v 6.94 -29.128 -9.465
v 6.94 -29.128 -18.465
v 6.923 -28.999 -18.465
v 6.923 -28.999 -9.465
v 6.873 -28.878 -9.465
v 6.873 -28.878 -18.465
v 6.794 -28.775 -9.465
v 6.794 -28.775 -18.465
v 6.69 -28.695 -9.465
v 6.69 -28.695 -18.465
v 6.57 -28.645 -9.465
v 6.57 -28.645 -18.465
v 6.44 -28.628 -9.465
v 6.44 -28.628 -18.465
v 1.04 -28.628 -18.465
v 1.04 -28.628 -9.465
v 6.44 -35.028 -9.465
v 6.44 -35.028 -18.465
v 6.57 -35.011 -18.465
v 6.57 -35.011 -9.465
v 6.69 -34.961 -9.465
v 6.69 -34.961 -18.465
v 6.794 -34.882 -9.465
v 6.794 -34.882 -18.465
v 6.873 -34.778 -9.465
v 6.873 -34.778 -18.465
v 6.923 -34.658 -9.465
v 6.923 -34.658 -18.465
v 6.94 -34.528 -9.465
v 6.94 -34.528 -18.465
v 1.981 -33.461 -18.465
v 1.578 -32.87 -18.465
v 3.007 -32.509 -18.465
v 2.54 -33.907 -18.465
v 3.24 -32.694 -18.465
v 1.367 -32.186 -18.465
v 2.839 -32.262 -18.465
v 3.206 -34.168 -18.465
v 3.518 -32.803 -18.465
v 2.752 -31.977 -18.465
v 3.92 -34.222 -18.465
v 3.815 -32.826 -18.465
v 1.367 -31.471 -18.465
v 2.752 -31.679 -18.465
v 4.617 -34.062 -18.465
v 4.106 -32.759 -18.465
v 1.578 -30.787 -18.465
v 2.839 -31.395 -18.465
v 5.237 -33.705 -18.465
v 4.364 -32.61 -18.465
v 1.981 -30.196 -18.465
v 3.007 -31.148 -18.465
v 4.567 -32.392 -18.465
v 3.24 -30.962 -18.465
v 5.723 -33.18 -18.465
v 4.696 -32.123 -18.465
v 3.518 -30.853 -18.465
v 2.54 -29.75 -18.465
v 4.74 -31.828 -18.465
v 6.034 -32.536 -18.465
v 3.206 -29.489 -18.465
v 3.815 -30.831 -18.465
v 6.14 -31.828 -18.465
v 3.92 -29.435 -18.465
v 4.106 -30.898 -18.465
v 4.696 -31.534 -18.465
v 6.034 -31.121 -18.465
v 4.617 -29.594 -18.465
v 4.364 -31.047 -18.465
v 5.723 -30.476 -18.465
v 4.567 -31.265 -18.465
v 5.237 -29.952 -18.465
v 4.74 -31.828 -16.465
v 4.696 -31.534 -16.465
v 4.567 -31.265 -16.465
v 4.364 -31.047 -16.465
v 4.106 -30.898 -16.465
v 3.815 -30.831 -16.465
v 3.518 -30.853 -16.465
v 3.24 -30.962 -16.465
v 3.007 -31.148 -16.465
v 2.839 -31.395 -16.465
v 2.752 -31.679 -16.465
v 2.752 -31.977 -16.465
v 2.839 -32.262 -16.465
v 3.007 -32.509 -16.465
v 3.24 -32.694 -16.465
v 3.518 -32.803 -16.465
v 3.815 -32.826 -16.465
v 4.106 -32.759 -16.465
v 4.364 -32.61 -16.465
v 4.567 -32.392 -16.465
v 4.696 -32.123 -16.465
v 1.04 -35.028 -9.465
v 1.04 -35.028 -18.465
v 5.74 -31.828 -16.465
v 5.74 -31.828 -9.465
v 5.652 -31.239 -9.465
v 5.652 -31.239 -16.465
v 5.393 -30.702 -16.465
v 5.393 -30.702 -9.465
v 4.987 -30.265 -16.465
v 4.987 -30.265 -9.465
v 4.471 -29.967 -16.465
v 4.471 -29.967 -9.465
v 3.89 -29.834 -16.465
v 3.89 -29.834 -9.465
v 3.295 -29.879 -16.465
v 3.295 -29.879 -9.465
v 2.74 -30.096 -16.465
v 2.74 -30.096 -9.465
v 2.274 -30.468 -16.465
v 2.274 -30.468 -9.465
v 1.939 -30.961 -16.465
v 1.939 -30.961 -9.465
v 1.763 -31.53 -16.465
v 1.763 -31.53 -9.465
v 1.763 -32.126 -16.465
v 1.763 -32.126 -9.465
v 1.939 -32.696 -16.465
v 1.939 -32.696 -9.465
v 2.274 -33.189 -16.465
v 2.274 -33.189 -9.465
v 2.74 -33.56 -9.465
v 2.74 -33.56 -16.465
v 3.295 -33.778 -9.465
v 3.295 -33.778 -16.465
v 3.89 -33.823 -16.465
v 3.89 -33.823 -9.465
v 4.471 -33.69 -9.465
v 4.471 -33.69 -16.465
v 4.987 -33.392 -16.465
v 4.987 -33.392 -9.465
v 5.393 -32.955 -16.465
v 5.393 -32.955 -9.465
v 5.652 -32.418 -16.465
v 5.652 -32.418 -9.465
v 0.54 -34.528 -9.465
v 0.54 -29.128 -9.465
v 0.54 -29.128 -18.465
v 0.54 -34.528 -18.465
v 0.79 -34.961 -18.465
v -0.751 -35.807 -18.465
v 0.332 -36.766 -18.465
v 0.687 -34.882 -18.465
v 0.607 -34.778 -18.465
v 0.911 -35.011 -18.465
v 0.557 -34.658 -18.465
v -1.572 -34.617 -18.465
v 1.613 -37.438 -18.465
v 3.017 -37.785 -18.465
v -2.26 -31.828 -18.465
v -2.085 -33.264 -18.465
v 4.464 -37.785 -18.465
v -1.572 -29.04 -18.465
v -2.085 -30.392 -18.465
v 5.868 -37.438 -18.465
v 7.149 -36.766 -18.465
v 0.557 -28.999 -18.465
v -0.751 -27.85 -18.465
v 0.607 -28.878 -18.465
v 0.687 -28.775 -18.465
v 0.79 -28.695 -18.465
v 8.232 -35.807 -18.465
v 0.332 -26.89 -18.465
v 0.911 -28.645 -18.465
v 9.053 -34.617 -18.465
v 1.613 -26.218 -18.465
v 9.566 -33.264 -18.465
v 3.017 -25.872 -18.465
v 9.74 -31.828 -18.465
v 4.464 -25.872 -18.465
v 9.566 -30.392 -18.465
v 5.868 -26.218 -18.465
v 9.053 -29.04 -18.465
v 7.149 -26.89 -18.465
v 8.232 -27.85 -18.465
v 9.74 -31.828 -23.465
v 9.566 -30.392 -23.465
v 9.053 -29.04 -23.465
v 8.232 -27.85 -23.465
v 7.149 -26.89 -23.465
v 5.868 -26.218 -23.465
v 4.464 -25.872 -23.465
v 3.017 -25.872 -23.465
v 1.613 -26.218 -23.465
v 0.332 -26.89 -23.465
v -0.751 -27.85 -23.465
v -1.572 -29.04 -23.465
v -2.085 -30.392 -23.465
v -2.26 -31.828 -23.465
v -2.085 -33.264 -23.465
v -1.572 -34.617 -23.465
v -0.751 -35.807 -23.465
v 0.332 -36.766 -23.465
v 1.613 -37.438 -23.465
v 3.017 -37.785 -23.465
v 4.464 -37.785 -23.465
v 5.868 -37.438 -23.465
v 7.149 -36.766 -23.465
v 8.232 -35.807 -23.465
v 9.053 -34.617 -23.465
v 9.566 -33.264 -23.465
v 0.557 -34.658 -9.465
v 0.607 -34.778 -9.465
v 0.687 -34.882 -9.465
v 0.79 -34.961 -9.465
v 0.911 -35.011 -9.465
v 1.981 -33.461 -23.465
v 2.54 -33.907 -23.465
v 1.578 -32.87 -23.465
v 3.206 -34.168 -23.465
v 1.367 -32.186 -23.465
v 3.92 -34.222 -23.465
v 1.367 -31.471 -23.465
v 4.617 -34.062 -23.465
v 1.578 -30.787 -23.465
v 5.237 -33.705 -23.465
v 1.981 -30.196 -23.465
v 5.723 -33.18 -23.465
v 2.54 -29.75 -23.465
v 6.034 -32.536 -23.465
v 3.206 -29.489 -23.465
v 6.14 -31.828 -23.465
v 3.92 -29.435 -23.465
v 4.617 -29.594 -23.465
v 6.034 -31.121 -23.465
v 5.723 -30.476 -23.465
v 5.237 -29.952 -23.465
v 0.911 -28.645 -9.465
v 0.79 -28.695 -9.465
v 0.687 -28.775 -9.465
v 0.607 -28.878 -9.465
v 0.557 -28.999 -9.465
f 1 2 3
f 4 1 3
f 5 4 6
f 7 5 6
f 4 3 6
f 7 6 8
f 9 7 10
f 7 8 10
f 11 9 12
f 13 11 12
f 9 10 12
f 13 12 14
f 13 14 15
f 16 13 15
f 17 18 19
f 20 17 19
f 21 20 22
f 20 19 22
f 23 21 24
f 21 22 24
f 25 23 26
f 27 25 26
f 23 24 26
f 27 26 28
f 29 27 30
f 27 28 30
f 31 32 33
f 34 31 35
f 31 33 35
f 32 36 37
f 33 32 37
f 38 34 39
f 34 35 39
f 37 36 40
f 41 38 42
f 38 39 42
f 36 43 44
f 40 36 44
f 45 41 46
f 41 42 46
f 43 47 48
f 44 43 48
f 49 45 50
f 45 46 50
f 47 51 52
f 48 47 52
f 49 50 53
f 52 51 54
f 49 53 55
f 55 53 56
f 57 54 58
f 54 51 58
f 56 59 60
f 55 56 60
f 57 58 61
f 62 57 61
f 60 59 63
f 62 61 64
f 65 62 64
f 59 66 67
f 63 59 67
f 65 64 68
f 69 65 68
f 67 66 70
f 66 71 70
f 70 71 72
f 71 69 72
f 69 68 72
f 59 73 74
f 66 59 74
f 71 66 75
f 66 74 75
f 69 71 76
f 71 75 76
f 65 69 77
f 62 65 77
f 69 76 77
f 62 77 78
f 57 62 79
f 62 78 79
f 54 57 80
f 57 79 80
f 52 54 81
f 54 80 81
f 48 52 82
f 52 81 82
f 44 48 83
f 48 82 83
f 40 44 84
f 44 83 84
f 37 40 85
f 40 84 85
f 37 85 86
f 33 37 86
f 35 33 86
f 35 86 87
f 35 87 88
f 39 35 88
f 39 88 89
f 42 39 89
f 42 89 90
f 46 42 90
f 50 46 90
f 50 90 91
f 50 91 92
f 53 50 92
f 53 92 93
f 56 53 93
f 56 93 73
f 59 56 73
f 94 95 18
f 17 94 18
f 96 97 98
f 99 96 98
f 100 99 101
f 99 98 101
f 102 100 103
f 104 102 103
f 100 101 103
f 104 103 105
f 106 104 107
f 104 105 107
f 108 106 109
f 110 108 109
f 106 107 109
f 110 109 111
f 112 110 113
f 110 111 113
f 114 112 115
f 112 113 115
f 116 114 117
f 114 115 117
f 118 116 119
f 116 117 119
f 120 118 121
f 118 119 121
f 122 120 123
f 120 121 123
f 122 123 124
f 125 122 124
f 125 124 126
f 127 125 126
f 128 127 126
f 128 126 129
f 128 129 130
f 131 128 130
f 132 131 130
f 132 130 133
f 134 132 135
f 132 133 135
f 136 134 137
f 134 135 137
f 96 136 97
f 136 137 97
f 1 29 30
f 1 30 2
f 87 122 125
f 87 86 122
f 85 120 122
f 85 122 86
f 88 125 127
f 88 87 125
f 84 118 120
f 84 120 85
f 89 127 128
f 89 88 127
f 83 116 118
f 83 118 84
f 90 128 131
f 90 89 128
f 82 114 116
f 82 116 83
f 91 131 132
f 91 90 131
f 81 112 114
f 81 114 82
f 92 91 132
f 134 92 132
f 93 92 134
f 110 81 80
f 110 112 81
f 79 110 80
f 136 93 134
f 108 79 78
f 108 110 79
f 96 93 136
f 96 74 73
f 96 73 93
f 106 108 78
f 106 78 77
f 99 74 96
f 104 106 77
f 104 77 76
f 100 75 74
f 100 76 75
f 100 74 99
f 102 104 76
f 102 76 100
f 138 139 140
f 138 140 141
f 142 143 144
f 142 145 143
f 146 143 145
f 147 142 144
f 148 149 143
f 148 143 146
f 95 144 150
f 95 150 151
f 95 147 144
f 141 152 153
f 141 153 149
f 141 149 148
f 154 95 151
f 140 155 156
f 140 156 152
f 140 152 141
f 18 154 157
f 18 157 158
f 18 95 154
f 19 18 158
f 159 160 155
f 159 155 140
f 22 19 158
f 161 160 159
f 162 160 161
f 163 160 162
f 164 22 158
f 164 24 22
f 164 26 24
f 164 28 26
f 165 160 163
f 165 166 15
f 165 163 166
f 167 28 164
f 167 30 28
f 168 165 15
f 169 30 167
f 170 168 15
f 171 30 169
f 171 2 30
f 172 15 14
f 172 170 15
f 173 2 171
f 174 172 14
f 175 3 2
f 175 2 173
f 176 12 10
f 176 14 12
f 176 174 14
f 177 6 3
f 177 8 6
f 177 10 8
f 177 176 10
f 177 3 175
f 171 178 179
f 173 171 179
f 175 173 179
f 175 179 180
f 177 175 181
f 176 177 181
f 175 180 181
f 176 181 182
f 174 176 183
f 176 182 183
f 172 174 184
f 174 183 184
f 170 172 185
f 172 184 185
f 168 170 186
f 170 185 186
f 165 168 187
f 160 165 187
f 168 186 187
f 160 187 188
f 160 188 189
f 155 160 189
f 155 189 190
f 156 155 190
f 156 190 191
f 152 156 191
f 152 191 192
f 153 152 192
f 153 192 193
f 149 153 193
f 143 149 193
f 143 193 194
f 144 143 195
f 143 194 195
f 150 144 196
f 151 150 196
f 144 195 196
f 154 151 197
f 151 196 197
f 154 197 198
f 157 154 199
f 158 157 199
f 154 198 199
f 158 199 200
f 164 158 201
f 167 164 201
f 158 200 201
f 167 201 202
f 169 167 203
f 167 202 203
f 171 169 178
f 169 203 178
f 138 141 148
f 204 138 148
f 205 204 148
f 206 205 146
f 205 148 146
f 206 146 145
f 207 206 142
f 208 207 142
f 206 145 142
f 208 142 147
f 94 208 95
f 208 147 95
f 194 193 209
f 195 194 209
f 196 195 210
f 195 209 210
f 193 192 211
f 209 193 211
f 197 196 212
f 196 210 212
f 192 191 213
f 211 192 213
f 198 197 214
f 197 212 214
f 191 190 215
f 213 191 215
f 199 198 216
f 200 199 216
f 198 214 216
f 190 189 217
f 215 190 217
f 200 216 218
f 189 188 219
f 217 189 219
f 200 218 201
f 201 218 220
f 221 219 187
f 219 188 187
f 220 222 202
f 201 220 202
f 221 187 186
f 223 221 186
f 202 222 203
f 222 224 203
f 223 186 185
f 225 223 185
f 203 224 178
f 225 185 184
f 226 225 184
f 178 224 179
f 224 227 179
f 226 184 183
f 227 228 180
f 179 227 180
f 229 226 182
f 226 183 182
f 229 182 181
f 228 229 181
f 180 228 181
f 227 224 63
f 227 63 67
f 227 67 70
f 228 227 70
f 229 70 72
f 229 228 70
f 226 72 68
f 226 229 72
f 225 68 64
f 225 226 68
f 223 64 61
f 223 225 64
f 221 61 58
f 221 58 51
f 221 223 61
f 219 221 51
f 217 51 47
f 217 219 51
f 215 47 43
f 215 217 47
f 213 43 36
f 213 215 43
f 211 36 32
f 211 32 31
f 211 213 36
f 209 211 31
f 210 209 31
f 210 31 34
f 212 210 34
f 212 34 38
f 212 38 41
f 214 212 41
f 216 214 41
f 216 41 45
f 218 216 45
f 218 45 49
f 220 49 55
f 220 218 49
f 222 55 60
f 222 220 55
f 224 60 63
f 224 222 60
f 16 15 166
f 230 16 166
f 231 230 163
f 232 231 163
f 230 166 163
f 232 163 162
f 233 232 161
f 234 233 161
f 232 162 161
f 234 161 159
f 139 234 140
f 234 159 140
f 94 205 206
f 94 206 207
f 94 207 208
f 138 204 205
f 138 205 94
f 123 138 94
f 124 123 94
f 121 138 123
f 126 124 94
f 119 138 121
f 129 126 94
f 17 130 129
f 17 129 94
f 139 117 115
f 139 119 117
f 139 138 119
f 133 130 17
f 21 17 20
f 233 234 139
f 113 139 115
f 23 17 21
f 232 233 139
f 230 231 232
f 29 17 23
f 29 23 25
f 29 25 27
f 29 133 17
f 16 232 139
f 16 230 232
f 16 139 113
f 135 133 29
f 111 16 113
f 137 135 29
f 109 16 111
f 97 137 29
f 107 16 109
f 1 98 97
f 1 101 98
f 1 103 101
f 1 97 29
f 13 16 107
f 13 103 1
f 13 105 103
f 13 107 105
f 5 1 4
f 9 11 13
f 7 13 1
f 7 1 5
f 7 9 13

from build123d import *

# Parameters (mm, degrees)
SKETCH1_R           = 6
SKETCH1_R_2         = 2.4
BOSS_EXTRUDE1_DEPTH = 5
BOSS_EXTRUDE2_DEPTH = 9
CUT_EXTRUDE1_REACH  = 16
SKETCH3_R           = 1
SKETCH4_R           = 2
CUT_EXTRUDE2_DEPTH  = 7


with BuildPart() as part:
    # Sketch1 → Boss-Extrude1 (new body)
    with BuildSketch(Plane.XY.offset(-23.465471353)):
        with Locations((3.740457308, -31.828386779)):
            Circle(SKETCH1_R)
        with Locations((3.740457308, -31.828386779)):
            Circle(SKETCH1_R_2, mode=Mode.SUBTRACT)
    extrude(amount=BOSS_EXTRUDE1_DEPTH)

    # Sketch2 → Boss-Extrude2 (add)
    with BuildSketch(Plane.XY.offset(-18.465471353)):
        with BuildLine():
            Line((6.440457308, -28.628386779), (1.040457308, -28.628386779))
            ThreePointArc((1.040457308, -28.628386779), (0.686903918, -28.774833388), (0.540457308, -29.128386779))
            Line((0.540457308, -29.128386779), (0.540457308, -34.528386779))
            ThreePointArc((0.540457308, -34.528386779), (0.686903918, -34.881940169), (1.040457308, -35.028386779))
            Line((1.040457308, -35.028386779), (6.440457308, -35.028386779))
            ThreePointArc((6.440457308, -35.028386779), (6.794010699, -34.881940169), (6.940457308, -34.528386779))
            Line((6.940457308, -34.528386779), (6.940457308, -29.128386779))
            ThreePointArc((6.940457308, -29.128386779), (6.794010699, -28.774833388), (6.440457308, -28.628386779))
        make_face()
    extrude(amount=BOSS_EXTRUDE2_DEPTH)

    # Sketch3 → Cut-Extrude1 (cut, up to next)
    with BuildSketch(Plane.XY.offset(-9.465471353), mode=Mode.PRIVATE) as cut_extrude1_sk1:
        with Locations((3.740457264, -31.828386779)):
            Circle(SKETCH3_R)
    cut_extrude1_tool1 = extrude(cut_extrude1_sk1.sketch, amount=-CUT_EXTRUDE1_REACH, mode=Mode.PRIVATE) & part.part
    add(cut_extrude1_tool1.solids().sort_by_distance((3.740457, -31.828387, -9.465471))[0], mode=Mode.SUBTRACT)

    # Sketch4 → Cut-Extrude2 (cut)
    with BuildSketch(Plane.XY.offset(-9.465471353)):
        with Locations((3.740457264, -31.828386779)):
            Circle(SKETCH4_R)
    extrude(amount=-CUT_EXTRUDE2_DEPTH, mode=Mode.SUBTRACT)


solid = part.part
